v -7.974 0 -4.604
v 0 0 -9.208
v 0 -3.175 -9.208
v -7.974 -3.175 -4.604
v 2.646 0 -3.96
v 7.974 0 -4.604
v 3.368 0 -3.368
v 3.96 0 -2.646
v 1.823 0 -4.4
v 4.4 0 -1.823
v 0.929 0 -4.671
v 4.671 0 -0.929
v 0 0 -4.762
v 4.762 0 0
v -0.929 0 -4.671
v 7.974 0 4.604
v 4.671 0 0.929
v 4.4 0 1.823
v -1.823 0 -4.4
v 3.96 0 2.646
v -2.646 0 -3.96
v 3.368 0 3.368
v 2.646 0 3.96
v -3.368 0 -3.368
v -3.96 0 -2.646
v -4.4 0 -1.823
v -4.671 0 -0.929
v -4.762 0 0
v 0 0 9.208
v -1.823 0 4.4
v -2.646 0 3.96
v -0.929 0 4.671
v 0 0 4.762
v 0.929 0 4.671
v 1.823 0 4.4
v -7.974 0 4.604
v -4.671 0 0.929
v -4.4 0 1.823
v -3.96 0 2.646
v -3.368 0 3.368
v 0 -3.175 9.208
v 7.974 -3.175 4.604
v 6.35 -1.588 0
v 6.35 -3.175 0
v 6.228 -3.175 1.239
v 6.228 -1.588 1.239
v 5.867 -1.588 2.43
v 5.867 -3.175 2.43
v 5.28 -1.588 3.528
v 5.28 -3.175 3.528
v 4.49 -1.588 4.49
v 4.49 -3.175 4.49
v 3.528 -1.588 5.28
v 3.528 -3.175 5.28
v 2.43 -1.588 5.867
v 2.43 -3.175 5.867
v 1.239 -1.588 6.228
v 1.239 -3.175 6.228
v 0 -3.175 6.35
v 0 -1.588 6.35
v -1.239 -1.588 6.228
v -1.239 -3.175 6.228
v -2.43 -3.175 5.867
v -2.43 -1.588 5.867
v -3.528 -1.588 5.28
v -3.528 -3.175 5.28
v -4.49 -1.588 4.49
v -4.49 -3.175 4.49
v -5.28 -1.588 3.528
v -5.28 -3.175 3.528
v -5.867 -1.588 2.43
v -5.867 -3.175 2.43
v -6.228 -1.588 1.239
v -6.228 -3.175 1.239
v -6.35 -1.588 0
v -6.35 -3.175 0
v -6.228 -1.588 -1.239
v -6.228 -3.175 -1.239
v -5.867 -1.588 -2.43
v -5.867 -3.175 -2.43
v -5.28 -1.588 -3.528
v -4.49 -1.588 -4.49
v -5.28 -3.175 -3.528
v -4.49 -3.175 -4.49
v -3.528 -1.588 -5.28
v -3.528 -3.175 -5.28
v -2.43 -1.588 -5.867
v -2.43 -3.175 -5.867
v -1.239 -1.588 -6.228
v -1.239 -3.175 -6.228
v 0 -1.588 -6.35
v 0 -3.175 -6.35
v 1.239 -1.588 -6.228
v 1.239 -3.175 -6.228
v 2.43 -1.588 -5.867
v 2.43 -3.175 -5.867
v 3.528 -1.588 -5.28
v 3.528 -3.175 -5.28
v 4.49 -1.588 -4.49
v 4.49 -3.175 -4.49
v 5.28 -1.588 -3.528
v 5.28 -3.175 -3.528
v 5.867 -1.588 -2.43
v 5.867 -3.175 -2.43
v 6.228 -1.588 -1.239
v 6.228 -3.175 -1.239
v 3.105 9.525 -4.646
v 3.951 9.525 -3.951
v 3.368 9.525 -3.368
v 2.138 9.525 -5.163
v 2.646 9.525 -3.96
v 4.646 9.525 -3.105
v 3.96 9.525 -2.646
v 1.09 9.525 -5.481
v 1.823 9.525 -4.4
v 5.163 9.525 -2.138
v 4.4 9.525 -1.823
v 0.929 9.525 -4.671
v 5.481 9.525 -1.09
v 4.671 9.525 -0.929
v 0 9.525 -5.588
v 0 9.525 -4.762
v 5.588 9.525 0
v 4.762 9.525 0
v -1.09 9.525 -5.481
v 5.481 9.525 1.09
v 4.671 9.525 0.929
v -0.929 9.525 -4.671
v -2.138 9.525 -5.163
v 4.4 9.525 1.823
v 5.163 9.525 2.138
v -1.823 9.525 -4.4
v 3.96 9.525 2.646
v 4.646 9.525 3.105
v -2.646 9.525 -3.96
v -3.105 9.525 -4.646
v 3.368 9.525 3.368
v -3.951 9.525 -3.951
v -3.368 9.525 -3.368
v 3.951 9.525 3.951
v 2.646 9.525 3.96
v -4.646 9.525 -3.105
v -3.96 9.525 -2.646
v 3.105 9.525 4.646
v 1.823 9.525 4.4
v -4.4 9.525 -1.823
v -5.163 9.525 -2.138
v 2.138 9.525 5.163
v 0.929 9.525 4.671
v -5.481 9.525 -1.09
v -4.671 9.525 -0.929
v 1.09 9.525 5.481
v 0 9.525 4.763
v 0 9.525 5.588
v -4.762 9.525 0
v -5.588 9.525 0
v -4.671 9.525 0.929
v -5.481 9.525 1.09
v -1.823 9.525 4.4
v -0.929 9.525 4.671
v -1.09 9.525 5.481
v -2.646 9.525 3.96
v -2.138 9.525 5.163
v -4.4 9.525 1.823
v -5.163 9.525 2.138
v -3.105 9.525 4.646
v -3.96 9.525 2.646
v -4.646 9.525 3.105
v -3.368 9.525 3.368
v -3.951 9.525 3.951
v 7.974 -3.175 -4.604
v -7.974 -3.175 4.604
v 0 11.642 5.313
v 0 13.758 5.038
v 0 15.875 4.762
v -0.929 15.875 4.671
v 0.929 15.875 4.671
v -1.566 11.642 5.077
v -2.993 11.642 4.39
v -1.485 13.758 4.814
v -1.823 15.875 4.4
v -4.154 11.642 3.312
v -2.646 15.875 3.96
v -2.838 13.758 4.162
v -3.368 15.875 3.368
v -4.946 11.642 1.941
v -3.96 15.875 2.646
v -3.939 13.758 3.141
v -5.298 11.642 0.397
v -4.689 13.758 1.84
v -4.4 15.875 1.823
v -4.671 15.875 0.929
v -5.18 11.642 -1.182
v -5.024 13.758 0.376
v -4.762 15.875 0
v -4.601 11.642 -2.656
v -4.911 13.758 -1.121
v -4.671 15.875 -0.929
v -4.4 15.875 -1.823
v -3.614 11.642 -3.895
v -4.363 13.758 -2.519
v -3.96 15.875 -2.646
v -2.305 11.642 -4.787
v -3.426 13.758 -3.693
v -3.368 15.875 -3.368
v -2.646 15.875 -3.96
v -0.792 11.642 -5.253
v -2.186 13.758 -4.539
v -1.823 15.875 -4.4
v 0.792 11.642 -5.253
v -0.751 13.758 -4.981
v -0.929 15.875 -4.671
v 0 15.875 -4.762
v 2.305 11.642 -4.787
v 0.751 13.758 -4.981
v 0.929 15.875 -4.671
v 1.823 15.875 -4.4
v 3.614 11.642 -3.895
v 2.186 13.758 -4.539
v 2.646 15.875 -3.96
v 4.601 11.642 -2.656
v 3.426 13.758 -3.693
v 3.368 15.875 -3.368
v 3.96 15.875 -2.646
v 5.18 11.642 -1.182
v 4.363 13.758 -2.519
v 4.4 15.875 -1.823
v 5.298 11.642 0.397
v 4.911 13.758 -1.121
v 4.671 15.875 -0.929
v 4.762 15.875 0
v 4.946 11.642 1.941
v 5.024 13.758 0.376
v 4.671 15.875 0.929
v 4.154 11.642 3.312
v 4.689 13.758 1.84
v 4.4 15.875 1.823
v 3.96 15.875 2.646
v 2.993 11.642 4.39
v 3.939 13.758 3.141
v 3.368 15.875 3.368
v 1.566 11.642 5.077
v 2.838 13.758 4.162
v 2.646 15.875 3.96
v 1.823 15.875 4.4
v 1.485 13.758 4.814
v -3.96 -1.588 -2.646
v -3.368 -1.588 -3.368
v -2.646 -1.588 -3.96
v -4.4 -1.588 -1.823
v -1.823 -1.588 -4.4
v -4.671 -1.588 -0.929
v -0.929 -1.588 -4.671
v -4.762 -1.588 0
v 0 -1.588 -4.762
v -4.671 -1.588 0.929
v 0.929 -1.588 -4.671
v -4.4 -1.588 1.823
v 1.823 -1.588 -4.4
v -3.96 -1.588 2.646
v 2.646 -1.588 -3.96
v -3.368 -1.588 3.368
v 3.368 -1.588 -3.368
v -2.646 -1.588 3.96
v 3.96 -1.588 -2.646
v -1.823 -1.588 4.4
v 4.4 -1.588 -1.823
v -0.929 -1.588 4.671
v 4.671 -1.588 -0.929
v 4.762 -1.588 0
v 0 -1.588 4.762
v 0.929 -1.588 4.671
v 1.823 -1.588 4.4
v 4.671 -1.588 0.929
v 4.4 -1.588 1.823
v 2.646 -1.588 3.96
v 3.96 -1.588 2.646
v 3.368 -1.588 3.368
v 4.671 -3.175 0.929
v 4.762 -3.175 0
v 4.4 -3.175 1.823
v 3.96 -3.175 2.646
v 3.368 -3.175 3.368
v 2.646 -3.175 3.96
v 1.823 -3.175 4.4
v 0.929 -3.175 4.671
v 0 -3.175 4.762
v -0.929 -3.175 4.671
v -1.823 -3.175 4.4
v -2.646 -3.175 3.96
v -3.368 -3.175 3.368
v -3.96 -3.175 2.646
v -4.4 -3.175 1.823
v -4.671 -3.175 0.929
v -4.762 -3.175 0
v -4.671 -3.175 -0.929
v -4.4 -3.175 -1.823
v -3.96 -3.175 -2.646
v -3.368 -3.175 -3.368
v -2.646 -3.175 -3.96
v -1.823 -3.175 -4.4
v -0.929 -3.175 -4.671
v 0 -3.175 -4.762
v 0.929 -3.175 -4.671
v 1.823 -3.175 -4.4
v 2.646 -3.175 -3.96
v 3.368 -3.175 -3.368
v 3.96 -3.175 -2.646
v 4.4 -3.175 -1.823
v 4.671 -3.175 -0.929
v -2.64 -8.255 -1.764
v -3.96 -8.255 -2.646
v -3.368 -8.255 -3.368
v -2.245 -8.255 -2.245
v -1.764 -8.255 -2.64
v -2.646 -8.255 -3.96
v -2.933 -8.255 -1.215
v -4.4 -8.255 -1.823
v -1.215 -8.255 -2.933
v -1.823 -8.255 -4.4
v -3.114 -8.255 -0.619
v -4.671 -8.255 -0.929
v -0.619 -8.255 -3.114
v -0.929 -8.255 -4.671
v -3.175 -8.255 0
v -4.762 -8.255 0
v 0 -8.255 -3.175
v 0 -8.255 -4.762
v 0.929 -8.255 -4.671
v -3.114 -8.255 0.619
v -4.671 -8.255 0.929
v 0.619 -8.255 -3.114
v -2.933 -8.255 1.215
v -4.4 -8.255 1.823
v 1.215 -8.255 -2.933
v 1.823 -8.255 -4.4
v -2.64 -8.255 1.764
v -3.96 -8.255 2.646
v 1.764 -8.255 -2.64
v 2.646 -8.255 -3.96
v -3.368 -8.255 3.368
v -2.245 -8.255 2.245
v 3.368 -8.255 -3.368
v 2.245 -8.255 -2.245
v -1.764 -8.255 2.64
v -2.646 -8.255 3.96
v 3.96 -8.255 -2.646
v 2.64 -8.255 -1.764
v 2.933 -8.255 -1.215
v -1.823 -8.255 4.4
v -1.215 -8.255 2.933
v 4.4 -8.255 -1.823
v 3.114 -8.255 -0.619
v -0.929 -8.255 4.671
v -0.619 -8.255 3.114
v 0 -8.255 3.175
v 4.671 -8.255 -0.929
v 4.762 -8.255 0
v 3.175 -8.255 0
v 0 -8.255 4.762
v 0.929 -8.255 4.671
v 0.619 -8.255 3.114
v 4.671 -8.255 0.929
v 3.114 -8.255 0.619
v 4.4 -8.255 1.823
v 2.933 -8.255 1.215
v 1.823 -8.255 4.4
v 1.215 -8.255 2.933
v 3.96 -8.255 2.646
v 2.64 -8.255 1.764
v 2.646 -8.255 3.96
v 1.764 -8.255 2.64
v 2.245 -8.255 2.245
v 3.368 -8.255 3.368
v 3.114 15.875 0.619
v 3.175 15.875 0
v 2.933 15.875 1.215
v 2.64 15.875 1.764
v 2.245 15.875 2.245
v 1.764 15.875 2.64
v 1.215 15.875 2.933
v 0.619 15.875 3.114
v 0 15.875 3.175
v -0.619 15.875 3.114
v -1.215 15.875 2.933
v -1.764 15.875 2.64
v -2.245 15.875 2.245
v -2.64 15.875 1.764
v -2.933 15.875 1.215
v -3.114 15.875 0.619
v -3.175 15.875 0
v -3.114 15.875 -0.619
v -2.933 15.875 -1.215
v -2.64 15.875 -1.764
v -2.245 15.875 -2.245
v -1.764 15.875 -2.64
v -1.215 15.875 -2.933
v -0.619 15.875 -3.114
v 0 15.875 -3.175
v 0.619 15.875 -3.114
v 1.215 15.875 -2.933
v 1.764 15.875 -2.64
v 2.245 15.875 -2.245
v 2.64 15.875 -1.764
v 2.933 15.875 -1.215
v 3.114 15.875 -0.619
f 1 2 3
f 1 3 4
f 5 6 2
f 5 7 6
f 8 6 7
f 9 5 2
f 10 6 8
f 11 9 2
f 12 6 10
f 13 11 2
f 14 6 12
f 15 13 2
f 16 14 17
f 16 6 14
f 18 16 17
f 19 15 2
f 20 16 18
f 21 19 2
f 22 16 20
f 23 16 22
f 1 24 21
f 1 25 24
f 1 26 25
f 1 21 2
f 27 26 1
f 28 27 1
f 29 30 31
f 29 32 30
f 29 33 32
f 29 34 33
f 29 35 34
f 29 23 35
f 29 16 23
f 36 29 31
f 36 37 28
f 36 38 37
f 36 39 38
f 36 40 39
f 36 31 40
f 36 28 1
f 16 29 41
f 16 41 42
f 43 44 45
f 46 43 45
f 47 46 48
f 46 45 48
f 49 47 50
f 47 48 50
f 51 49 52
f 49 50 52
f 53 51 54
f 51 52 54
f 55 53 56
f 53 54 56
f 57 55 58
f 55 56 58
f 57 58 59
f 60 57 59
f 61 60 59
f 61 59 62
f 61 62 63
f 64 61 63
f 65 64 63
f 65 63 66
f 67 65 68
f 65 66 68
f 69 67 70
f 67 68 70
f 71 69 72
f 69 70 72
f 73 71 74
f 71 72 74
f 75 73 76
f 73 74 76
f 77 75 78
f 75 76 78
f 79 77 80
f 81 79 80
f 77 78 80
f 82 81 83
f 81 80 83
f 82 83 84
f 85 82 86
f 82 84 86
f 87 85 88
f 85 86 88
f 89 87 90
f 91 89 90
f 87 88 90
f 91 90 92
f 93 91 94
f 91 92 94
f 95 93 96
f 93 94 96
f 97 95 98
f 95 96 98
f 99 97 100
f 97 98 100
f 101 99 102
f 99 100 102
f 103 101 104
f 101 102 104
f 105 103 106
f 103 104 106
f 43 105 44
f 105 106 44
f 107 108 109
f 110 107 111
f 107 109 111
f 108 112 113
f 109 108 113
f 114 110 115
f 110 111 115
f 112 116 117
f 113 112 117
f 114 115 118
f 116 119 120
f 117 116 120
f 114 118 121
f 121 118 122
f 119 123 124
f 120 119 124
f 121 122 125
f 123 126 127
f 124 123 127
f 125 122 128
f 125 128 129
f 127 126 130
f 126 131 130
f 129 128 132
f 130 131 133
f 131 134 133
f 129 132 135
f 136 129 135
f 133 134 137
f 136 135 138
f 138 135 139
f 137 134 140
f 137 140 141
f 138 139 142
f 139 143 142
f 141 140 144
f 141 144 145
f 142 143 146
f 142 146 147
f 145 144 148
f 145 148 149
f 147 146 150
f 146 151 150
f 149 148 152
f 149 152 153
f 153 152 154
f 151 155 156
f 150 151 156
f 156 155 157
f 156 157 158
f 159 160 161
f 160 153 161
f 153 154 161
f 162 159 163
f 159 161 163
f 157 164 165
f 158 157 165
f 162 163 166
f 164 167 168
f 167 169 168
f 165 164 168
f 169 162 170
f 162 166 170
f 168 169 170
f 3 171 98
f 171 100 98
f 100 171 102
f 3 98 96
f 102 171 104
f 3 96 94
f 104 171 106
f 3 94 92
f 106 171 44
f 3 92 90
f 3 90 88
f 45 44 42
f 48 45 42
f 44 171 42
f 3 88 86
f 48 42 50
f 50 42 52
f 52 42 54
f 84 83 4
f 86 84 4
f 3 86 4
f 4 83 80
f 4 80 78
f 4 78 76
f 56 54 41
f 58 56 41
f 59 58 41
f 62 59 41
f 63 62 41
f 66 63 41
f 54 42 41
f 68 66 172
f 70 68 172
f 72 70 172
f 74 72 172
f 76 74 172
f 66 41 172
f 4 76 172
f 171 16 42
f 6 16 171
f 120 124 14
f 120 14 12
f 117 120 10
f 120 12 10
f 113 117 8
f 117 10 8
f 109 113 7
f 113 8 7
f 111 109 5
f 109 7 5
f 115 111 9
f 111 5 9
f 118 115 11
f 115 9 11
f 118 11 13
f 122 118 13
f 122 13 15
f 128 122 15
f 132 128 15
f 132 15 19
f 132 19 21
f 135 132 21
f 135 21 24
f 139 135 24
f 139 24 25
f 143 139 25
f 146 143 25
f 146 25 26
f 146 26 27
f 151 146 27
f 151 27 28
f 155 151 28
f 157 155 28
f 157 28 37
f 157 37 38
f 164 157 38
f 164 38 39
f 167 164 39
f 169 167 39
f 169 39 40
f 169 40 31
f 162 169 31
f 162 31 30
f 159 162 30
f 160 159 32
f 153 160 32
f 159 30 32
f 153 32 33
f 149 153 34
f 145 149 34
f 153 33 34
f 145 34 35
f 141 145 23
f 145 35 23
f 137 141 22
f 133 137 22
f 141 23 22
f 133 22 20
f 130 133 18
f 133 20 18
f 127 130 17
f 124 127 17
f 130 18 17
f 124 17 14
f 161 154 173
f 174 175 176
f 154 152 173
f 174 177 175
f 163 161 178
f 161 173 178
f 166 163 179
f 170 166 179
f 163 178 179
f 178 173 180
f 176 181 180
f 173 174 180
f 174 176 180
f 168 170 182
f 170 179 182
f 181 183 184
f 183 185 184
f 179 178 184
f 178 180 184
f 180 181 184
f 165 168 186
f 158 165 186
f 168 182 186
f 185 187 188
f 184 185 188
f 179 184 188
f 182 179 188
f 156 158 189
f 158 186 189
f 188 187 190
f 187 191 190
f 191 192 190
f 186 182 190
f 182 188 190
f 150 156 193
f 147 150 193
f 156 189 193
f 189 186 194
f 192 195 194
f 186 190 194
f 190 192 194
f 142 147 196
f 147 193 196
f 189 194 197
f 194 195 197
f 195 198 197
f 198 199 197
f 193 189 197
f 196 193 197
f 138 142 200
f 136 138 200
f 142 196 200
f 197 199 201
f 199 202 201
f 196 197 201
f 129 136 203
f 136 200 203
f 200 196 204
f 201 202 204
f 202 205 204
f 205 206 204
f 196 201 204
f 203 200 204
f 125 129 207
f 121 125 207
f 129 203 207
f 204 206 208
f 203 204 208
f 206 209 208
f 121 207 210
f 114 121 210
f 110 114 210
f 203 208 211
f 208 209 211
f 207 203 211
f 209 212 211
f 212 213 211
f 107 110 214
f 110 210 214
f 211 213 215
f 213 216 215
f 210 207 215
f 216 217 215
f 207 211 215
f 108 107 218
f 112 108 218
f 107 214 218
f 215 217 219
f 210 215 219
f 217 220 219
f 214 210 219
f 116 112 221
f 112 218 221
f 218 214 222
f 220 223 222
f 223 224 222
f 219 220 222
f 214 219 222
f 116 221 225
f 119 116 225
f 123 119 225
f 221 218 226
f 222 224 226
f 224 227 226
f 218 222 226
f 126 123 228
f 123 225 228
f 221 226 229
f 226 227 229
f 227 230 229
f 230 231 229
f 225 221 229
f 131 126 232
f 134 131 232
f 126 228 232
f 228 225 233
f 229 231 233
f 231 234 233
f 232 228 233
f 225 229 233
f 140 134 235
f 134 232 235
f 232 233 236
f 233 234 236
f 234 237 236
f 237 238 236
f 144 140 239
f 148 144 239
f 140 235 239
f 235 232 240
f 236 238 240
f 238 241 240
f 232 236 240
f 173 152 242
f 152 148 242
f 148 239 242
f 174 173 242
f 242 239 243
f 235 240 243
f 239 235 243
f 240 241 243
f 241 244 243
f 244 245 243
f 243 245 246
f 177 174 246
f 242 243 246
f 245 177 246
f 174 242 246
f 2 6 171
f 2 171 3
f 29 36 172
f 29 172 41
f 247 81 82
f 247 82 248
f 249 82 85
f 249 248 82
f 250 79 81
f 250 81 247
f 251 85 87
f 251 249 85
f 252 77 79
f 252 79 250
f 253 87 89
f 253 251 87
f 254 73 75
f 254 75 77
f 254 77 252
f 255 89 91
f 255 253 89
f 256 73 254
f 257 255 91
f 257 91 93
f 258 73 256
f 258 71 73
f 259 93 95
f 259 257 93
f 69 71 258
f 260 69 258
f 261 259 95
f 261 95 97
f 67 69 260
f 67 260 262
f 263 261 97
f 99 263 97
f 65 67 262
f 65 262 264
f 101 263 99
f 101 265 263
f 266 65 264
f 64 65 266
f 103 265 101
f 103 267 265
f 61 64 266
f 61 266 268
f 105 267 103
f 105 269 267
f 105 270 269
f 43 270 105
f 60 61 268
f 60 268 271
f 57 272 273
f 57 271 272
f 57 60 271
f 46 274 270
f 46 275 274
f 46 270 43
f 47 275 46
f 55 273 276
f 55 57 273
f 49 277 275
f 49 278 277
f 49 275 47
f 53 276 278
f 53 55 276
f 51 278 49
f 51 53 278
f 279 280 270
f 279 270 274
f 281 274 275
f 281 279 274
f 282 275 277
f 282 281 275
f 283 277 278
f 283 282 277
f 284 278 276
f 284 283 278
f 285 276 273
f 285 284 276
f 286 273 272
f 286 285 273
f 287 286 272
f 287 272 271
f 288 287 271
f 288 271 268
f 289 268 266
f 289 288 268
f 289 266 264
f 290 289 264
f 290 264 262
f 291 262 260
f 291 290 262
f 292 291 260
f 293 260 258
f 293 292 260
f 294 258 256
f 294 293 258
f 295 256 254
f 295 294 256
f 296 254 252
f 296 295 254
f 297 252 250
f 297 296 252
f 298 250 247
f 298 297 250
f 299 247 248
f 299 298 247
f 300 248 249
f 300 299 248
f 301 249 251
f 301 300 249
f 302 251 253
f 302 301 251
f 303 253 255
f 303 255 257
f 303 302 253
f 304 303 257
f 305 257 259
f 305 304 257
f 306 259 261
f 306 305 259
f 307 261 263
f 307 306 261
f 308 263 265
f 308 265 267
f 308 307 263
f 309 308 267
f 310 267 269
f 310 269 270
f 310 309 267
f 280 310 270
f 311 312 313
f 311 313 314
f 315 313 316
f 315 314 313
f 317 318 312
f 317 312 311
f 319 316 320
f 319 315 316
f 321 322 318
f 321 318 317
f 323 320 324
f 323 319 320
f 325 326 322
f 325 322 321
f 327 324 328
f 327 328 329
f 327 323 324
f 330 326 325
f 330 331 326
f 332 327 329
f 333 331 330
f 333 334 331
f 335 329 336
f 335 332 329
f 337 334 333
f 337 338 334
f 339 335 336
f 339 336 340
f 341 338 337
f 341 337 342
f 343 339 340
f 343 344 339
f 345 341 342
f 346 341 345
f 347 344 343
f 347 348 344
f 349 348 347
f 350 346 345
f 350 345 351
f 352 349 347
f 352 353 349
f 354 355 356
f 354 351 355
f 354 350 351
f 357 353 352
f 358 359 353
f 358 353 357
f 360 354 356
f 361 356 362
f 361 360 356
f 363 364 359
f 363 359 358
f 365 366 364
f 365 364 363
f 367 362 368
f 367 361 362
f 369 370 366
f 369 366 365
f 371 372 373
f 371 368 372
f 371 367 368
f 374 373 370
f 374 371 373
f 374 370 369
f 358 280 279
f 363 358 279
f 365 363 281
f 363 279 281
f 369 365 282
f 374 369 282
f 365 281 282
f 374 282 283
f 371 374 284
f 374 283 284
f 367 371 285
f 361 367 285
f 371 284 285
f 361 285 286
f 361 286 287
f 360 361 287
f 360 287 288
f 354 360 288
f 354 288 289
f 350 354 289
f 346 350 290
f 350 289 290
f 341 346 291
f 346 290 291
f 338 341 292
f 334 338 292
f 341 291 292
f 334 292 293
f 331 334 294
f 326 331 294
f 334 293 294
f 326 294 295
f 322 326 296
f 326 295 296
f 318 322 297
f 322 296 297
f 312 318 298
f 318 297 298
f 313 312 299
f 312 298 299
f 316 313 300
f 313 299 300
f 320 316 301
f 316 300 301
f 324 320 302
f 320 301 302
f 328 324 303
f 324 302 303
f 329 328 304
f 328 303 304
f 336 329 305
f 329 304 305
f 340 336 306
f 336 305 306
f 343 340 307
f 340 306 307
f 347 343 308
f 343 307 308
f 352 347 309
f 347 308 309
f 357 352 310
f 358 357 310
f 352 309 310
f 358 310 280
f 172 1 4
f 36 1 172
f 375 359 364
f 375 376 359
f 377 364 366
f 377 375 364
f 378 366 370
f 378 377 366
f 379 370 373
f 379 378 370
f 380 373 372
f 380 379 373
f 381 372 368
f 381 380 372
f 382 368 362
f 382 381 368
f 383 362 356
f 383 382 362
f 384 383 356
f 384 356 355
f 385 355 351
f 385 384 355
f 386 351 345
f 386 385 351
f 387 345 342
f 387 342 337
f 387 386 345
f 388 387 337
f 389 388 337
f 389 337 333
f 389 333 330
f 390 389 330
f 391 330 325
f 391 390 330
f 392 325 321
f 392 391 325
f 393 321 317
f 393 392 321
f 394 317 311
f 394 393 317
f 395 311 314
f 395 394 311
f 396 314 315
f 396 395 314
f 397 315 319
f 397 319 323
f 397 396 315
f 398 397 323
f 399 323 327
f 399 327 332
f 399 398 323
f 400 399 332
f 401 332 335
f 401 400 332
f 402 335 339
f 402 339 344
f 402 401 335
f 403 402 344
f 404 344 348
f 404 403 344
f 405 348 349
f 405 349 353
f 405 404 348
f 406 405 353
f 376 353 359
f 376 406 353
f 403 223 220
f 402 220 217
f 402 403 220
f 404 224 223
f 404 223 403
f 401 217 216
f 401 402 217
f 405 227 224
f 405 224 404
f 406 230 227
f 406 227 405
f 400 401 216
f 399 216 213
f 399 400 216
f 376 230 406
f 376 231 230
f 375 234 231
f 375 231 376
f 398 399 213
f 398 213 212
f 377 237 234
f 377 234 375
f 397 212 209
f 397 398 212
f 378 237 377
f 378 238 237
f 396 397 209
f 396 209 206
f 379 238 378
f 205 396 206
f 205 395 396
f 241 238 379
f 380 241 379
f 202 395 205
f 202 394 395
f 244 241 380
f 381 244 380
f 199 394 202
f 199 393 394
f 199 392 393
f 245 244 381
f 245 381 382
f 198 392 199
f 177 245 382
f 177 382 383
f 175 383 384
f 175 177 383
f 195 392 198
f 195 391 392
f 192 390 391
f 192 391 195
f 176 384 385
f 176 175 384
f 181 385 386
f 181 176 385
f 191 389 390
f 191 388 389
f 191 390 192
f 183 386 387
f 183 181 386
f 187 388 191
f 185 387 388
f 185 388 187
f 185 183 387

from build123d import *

# Parameters (mm, degrees)
SKETCH1_R          = 4.7625
SKETCH1_R_2        = 3.175
EXTRUDE1_DEPTH     = 15.875
SKETCH2_R          = 3.175
EXTRUDE2_DEPTH     = 3.175
SKETCH3_R          = 4.7625
SKETCH3_R_2        = 3.175
EXTRUDE3_DEPTH     = 5.08
SKETCH4_R          = 6.35
SKETCH4_R_2        = 4.7625
CUT_EXTRUDE1_DEPTH = 1.5875
SKETCH5_R          = 5.588
SKETCH5_R_2        = 4.7625
EXTRUDE4_DEPTH     = 6.35


with BuildPart() as part:
    # Sketch1 → Extrude1 (new body)
    with BuildSketch(Plane(origin=(0, 0, 0), x_dir=(1, 0, 0), z_dir=(0, 1, 0))):
        Circle(SKETCH1_R)
        Circle(SKETCH1_R_2, mode=Mode.SUBTRACT)
    extrude(amount=EXTRUDE1_DEPTH)

    # Sketch2 → Extrude2 (add)
    with BuildSketch(Plane.XZ):
        Polygon((7.973928905, 4.60375), (7.973928905, -4.60375), (0, -9.2075), (-7.973928905, -4.60375), (-7.973928905, 4.60375), (0, 9.2075), align=None)
        Circle(SKETCH2_R, mode=Mode.SUBTRACT)
    extrude(amount=EXTRUDE2_DEPTH)

    # Sketch3 → Extrude3 (add)
    with BuildSketch(Plane.XZ.offset(3.175)):
        Circle(SKETCH3_R)
        Circle(SKETCH3_R_2, mode=Mode.SUBTRACT)
    extrude(amount=EXTRUDE3_DEPTH)

    # Sketch4 → Cut-Extrude1 (cut)
    with BuildSketch(Plane.XZ.offset(3.175)):
        Circle(SKETCH4_R)
        Circle(SKETCH4_R_2, mode=Mode.SUBTRACT)
    extrude(amount=-CUT_EXTRUDE1_DEPTH, mode=Mode.SUBTRACT)

    # Sketch5 → Extrude4 (add)
    with BuildSketch(Plane(origin=(0, 15.875, 0), x_dir=(-1, 0, 0), z_dir=(0, 1, 0))):
        Circle(SKETCH5_R)
        Circle(SKETCH5_R_2, mode=Mode.SUBTRACT)
    extrude(amount=-EXTRUDE4_DEPTH)

    # Sketch7 → Cut-Revolve1 (revolve, cut)
    with BuildSketch(Plane(origin=(0, 0, 0), x_dir=(0, 0, -1), z_dir=(1, 0, 0))):
        Polygon((-5.588, 9.525), (-4.7625, 15.875), (-5.588, 15.875), align=None)
    revolve(axis=Axis((0, 15.875, 0), (0, -1, 0)), mode=Mode.SUBTRACT)


solid = part.part
